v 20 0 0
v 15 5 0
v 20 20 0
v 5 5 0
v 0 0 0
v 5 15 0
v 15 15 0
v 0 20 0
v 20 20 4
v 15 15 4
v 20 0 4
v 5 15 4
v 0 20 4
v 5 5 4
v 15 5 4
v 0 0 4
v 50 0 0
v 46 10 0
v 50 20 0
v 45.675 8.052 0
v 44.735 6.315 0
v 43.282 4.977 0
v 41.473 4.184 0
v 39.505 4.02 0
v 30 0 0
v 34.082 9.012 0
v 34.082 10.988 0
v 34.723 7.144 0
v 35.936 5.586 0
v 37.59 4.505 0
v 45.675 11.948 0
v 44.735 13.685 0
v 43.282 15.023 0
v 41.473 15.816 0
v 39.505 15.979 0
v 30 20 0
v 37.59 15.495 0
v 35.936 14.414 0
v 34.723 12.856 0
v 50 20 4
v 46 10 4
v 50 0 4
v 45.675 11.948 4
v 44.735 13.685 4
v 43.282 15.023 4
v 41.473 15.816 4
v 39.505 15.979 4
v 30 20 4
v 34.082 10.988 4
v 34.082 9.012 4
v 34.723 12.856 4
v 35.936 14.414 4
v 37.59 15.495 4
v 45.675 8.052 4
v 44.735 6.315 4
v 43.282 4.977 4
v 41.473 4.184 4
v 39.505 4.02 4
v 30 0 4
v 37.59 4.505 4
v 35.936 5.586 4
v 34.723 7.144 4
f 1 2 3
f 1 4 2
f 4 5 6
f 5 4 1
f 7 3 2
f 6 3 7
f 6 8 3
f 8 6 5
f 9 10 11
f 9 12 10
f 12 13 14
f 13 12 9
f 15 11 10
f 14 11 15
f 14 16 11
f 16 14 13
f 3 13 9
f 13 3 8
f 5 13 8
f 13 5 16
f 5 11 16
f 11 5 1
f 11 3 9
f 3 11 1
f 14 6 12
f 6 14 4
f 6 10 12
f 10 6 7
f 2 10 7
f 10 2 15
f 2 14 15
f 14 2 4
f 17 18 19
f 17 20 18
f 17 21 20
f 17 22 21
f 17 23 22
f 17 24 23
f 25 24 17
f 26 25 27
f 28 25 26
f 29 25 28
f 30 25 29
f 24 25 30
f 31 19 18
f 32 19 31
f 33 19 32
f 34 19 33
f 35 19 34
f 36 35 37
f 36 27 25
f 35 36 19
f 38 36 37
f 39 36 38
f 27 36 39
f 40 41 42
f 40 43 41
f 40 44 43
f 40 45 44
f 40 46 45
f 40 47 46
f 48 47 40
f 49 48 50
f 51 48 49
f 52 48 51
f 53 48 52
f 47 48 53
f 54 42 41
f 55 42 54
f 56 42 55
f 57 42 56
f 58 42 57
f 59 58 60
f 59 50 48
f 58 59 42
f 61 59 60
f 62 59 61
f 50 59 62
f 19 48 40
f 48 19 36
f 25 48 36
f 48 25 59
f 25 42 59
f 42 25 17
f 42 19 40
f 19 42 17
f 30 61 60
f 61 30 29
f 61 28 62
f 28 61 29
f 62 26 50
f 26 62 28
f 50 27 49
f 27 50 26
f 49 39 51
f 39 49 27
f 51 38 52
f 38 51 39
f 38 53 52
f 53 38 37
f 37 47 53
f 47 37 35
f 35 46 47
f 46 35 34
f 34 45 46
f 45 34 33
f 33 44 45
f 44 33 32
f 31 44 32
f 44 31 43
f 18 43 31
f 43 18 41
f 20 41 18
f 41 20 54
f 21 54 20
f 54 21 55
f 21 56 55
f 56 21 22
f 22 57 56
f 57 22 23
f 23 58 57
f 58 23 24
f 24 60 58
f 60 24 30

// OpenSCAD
// 2D with a hole via paths, then extruded so the result is a solid
linear_extrude(height = 4)
polygon(
    points = [[0,0],[20,0],[20,20],[0,20], [5,5],[15,5],[15,15],[5,15]],
    paths  = [[0,1,2,3], [4,5,6,7]]
);
translate([30, 0, 0]) linear_extrude(height = 4) difference() {
    square([20, 20]);
    translate([10, 10]) circle(r = 6);
}
